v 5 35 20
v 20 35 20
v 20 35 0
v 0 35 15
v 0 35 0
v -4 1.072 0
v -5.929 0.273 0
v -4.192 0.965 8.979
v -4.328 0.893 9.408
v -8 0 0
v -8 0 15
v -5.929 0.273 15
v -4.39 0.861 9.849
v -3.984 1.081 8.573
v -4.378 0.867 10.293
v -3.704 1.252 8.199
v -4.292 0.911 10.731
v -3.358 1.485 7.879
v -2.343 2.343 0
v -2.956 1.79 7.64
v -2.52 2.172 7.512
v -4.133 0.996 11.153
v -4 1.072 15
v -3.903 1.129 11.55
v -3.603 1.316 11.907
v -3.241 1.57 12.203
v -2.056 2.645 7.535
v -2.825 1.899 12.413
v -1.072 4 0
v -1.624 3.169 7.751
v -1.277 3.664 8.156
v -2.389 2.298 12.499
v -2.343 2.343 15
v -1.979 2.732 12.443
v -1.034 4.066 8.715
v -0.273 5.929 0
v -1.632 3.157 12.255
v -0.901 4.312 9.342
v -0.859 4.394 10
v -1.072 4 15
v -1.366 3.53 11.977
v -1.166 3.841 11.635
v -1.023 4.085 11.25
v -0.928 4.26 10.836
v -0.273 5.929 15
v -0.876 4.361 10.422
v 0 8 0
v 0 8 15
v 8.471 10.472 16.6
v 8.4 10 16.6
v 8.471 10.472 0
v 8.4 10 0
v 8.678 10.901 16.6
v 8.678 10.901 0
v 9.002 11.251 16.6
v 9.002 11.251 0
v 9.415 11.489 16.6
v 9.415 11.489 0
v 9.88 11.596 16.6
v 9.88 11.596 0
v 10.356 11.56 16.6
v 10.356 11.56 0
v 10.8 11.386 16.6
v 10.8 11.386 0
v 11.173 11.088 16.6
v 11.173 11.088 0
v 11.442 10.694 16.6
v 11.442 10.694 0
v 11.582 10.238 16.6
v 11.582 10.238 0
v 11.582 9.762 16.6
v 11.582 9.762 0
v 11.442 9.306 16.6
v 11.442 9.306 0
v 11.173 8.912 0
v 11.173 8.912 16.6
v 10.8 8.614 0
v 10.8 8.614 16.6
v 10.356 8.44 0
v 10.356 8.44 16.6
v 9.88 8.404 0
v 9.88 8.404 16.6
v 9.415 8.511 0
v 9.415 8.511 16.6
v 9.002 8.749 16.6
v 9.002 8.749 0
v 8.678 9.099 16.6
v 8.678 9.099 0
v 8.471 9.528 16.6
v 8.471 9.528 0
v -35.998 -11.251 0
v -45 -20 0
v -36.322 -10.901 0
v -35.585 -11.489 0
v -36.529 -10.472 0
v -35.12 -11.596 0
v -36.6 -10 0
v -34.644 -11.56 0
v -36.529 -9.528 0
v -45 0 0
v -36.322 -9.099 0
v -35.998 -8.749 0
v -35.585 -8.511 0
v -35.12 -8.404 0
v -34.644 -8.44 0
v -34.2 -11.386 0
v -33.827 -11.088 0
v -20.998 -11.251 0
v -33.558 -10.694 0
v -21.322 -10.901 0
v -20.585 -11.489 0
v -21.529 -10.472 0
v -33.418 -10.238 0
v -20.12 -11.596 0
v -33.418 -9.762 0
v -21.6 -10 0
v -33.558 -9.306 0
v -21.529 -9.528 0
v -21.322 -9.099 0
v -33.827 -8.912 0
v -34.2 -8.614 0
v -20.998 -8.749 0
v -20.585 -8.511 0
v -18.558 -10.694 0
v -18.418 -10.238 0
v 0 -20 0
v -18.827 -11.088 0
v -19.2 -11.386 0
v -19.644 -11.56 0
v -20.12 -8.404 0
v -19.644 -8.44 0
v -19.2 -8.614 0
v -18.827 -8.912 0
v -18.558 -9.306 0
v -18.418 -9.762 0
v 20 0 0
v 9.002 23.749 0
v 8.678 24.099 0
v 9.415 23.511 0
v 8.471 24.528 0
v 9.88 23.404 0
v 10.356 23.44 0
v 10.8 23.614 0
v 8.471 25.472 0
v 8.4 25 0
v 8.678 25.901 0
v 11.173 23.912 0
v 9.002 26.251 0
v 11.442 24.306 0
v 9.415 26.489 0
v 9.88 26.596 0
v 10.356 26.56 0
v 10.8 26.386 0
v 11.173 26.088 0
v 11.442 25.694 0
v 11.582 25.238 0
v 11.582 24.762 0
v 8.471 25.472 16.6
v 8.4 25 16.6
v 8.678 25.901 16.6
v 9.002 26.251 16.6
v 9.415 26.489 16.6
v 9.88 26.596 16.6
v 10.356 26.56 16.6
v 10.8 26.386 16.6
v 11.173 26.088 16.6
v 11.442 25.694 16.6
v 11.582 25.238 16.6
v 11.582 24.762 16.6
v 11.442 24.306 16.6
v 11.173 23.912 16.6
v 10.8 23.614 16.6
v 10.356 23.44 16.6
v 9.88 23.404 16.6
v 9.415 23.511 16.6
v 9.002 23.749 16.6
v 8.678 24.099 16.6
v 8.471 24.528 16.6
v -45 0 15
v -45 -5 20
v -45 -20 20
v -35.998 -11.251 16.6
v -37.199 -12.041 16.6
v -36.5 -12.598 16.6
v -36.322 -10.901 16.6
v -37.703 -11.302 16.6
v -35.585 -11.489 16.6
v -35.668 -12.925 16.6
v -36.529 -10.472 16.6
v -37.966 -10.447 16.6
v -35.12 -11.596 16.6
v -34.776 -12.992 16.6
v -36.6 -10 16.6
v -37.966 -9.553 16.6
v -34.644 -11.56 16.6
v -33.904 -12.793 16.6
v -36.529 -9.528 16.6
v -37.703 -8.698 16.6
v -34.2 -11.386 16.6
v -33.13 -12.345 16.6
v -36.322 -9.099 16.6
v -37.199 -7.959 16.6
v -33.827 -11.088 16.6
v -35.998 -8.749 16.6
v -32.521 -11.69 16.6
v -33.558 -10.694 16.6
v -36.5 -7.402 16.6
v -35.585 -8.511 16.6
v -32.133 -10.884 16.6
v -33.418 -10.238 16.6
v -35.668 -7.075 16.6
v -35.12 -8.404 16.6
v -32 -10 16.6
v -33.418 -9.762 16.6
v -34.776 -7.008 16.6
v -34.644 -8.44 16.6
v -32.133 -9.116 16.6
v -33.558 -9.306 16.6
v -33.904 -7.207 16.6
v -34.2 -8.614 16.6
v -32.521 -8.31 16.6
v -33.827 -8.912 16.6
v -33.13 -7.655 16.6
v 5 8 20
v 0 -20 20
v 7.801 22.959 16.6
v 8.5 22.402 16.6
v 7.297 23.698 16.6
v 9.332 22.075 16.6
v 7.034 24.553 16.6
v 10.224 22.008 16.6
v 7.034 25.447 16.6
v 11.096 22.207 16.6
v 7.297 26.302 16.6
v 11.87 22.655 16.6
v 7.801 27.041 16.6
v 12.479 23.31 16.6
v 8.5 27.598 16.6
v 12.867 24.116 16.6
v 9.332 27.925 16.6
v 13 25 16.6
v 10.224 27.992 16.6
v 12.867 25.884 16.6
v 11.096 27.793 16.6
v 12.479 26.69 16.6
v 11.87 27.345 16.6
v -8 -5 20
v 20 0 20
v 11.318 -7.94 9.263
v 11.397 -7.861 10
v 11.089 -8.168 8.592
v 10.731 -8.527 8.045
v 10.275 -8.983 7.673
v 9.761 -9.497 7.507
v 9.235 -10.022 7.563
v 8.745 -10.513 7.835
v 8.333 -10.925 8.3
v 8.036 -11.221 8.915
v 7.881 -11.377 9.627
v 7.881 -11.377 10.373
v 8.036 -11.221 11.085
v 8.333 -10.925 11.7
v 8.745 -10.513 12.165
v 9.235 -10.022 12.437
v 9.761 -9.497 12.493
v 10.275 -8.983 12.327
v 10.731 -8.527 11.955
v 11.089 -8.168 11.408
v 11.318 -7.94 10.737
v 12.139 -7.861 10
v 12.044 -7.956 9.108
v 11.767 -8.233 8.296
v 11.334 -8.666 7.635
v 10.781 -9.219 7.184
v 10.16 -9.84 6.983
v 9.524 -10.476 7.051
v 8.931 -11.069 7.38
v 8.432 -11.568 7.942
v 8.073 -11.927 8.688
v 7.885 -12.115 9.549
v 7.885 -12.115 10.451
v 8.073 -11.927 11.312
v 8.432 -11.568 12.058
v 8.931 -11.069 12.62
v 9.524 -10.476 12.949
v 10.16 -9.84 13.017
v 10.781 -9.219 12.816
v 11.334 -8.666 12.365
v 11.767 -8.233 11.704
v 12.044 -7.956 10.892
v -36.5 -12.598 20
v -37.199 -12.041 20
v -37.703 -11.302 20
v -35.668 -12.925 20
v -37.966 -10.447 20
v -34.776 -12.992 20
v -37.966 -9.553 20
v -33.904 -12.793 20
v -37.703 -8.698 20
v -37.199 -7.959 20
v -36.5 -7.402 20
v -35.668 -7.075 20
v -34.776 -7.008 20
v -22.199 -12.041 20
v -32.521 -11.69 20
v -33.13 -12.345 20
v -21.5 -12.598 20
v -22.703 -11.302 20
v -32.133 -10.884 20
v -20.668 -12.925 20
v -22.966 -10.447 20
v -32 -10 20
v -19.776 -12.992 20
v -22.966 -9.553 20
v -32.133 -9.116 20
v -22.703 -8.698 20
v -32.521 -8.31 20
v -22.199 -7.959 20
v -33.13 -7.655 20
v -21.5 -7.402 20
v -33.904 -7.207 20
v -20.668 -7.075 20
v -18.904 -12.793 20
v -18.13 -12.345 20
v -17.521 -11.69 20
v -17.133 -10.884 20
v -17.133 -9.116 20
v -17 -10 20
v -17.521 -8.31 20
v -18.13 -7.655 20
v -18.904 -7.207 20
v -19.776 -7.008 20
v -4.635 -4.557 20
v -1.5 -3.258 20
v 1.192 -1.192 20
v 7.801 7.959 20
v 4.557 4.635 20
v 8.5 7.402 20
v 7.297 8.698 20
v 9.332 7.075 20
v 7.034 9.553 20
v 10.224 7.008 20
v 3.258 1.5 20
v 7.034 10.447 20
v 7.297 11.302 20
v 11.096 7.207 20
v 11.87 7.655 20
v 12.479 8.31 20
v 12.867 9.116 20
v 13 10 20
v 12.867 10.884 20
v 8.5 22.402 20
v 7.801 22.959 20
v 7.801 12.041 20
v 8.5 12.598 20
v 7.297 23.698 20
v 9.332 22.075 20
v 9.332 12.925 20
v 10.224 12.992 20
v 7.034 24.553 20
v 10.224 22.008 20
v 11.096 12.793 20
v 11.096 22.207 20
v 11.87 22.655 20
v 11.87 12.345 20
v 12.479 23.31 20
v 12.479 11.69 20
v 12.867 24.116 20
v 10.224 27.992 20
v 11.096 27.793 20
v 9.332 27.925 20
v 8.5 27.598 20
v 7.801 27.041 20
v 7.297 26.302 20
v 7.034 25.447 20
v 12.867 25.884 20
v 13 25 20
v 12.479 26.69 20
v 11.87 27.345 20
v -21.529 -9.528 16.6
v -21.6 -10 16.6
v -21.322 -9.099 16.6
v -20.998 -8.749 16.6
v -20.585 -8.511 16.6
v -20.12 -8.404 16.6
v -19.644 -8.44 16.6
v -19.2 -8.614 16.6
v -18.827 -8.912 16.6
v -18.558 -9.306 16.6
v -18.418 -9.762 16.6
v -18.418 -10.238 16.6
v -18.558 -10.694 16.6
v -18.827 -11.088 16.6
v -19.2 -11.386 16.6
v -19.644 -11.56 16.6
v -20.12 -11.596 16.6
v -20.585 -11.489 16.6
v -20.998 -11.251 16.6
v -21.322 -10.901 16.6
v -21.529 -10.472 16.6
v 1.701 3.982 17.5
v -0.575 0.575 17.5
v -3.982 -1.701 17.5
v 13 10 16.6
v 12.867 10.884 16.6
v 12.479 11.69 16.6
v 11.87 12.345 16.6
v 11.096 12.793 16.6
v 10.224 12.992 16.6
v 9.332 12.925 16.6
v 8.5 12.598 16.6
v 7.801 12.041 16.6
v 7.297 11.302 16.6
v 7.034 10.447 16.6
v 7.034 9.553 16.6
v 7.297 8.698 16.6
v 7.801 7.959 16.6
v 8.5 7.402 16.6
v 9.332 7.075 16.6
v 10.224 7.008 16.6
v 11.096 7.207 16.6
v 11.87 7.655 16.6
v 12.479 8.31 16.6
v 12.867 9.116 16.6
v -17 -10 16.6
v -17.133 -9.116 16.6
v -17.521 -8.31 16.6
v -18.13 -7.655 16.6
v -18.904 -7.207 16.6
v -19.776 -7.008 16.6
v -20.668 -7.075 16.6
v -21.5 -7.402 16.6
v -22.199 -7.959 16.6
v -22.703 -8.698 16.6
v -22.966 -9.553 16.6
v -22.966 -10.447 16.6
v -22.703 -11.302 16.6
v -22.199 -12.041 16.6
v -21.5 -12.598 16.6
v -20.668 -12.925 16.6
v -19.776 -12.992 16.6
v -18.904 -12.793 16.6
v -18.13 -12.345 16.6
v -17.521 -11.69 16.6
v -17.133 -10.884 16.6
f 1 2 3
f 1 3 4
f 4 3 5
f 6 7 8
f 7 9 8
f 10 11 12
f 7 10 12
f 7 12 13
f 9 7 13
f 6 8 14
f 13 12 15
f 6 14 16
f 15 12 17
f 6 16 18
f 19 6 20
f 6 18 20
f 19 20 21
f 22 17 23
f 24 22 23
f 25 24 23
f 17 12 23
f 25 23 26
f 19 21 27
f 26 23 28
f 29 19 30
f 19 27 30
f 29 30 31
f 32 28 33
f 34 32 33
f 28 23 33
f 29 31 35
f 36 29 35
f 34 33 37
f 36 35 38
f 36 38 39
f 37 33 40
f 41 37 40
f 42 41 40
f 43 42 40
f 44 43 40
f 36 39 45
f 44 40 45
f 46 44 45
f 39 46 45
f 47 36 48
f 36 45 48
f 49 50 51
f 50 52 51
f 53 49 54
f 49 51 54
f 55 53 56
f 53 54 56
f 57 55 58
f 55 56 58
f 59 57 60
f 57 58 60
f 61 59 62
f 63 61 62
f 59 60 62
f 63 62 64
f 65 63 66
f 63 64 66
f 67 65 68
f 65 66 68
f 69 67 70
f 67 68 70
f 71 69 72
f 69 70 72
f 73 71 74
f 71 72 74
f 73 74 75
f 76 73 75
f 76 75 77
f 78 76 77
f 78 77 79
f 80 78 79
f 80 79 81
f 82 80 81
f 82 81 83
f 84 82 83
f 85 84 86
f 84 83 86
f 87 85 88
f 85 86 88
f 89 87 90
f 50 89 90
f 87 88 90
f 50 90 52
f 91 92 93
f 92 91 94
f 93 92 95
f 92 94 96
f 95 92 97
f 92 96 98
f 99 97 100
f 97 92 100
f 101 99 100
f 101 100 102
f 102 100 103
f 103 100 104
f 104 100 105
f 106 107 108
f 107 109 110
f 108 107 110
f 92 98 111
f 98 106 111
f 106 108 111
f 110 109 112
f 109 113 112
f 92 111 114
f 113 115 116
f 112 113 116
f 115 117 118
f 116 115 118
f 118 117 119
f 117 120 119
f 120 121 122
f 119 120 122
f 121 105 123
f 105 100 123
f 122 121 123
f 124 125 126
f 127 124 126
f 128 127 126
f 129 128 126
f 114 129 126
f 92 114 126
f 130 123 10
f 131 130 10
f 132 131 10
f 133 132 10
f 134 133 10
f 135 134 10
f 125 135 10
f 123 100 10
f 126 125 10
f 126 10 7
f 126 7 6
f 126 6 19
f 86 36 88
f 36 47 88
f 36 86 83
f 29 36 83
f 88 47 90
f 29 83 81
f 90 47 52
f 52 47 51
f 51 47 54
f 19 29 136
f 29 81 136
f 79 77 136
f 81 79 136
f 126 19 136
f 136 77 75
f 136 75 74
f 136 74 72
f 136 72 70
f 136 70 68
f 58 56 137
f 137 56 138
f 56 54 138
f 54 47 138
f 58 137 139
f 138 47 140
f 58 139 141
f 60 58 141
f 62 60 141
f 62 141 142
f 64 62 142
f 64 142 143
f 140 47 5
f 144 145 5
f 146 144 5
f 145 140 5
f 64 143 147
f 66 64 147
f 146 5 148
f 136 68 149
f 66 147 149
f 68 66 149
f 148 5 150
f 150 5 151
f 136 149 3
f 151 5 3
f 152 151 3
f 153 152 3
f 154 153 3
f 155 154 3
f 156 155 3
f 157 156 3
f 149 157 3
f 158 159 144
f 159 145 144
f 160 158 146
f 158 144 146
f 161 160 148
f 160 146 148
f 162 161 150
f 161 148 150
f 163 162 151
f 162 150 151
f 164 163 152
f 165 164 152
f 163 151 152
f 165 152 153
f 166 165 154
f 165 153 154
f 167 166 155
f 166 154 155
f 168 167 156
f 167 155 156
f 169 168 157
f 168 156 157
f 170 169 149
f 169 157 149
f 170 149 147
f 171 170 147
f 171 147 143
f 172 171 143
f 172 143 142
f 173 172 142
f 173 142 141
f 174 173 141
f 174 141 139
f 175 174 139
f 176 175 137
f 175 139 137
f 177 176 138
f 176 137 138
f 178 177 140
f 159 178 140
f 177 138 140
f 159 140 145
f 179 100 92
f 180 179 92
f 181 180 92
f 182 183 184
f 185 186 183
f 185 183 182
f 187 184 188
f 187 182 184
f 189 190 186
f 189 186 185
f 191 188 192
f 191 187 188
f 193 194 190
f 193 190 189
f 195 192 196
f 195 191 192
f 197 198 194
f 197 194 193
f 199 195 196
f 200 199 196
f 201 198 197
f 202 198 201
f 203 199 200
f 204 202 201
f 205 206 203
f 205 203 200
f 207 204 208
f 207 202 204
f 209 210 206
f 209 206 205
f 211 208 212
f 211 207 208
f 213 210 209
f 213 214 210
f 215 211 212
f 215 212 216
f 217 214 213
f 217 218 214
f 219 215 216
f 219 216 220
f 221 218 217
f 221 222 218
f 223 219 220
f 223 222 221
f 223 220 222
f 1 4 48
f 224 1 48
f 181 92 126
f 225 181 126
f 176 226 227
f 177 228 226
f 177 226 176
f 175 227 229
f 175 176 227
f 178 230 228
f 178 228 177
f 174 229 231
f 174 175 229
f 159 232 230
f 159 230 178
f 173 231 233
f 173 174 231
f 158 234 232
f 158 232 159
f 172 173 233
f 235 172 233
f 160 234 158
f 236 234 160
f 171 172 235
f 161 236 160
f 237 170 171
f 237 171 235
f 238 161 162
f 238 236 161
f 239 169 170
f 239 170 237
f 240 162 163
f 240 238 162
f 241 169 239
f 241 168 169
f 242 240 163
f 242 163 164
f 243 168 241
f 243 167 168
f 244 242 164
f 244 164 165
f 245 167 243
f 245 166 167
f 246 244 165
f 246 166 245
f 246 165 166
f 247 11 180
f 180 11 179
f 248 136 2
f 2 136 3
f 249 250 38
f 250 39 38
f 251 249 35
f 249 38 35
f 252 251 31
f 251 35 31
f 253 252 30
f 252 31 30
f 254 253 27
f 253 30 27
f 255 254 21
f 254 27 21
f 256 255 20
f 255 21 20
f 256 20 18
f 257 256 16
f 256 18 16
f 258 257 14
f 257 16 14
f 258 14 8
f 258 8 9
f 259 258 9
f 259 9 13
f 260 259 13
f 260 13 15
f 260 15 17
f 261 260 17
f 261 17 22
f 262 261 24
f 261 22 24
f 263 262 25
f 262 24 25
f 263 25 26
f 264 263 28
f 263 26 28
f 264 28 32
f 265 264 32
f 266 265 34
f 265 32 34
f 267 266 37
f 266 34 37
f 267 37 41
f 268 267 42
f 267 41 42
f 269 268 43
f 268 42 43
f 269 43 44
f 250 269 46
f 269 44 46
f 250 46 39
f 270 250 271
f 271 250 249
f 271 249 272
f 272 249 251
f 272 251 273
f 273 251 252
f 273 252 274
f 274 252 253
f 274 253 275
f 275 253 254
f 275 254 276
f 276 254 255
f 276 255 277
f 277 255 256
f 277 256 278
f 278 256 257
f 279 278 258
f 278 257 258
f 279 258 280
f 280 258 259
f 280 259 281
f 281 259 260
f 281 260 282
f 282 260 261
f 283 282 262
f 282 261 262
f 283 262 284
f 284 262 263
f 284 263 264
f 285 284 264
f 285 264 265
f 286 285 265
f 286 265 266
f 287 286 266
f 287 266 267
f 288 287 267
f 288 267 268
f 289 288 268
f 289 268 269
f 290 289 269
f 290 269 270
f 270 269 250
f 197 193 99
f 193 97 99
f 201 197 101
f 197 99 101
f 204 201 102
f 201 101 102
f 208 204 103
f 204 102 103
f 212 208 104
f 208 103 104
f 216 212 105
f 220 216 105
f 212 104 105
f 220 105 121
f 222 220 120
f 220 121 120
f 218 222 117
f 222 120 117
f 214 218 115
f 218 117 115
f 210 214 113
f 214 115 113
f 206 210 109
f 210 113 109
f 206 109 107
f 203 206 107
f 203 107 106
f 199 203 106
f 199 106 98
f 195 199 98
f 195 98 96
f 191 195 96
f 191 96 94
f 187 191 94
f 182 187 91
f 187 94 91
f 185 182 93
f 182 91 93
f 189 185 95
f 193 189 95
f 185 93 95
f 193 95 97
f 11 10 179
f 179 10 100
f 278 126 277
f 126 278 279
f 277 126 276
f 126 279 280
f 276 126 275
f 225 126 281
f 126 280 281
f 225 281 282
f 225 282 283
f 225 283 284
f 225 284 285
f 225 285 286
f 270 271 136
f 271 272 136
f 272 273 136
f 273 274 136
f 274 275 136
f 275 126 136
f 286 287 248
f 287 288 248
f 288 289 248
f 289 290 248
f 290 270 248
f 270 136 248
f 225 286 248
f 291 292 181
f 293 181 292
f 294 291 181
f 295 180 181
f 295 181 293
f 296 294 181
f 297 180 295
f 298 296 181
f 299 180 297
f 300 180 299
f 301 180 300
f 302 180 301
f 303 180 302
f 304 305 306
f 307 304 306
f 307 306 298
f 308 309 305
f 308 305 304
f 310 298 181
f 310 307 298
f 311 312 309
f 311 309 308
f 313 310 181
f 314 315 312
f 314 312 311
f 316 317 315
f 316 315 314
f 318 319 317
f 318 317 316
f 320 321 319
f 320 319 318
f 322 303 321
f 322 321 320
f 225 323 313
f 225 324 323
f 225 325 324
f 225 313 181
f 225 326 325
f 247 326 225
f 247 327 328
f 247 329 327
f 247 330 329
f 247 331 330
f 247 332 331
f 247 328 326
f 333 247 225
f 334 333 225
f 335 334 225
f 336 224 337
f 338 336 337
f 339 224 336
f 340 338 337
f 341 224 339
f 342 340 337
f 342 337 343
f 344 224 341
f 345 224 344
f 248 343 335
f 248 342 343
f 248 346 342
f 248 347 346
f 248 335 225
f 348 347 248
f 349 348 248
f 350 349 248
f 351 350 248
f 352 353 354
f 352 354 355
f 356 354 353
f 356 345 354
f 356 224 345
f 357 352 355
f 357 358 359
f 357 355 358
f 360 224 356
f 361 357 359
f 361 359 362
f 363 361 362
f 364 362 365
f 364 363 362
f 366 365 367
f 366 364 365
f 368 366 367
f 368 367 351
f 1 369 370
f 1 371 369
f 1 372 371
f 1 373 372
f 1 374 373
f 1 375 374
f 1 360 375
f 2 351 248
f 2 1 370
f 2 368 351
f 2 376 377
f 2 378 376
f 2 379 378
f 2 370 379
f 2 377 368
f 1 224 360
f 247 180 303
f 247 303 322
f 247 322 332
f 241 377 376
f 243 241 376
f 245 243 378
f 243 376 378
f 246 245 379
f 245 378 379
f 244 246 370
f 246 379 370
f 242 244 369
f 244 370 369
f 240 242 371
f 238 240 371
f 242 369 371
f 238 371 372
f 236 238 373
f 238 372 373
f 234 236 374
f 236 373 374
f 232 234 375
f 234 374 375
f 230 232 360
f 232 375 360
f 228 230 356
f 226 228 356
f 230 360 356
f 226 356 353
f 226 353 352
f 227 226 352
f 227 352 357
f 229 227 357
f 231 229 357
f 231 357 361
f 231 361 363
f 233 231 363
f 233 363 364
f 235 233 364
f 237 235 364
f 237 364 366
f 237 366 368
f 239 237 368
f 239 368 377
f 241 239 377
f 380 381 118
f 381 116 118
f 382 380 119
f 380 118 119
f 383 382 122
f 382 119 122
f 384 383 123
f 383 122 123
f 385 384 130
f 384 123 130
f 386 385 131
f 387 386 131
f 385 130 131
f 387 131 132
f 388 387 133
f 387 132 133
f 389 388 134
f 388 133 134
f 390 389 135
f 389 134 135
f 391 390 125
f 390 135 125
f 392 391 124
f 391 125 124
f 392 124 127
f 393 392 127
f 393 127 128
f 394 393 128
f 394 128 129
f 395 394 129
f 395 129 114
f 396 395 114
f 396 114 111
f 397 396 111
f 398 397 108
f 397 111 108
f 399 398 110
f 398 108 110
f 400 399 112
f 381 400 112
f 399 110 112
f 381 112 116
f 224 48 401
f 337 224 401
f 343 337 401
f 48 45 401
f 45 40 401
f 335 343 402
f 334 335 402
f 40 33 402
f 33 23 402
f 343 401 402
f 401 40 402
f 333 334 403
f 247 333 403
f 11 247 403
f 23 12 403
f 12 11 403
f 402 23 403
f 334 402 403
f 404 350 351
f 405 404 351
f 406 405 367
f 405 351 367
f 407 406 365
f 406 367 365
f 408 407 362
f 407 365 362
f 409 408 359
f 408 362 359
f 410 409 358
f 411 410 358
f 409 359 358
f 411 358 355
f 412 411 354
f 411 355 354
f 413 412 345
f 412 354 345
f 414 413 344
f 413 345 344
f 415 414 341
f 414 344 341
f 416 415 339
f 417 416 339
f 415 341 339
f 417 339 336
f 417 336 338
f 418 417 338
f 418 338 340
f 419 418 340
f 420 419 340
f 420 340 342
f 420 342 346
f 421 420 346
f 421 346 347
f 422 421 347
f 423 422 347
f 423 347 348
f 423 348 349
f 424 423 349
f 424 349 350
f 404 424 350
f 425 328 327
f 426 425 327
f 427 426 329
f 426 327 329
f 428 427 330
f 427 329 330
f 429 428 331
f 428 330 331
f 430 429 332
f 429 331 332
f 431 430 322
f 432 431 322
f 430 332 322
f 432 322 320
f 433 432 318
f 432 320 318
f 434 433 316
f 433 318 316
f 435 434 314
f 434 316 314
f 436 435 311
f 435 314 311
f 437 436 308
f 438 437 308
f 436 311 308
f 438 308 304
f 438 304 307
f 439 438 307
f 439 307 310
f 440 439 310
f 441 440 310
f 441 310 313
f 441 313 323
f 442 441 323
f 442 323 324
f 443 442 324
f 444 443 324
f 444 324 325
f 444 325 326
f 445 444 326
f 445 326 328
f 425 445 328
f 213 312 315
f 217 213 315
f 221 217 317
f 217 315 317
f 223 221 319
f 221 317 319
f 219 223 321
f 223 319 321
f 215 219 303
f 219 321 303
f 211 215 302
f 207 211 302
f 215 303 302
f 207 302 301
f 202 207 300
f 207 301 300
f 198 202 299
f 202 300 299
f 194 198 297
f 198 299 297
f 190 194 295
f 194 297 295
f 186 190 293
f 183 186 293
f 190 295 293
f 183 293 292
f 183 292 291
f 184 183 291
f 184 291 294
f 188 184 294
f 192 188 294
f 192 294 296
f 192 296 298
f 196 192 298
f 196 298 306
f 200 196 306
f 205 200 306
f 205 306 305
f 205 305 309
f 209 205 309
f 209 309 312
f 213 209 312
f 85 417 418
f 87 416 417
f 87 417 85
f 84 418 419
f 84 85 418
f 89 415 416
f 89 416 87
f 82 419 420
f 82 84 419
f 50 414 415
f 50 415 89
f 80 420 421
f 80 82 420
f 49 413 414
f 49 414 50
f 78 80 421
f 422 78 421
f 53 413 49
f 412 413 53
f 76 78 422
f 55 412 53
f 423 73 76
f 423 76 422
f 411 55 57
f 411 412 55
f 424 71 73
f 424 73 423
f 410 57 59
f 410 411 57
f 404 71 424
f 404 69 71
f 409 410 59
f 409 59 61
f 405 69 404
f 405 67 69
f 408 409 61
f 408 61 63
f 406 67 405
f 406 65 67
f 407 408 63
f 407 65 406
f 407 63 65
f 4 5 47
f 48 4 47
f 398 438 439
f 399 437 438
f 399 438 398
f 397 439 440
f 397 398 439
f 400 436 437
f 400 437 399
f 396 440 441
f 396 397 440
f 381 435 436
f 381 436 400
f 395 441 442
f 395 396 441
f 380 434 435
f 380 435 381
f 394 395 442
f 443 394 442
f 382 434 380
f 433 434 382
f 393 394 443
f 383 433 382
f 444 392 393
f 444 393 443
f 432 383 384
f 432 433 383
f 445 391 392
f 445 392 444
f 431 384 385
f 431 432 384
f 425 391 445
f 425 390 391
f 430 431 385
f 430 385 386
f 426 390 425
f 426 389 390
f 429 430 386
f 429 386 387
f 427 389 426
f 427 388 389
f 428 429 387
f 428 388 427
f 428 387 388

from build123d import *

# Parameters (mm, degrees)
BOSS_EXTRUDE1_DEPTH                                  = 20
CBORE_FOR_M3_HEXAGON_SOCKET_HEAD_CAP_SCR_D           = 3.2
CBORE_FOR_M3_HEXAGON_SOCKET_HEAD_CAP_SCR_CBORE_D     = 6
CBORE_FOR_M3_HEXAGON_SOCKET_HEAD_CAP_SCR_CBORE_DEPTH = 3.4
FILLET1_R                                            = 8
CHAMFER1_SIZE                                        = 20
M6_TAPPED_HOLE1_D                                    = 5
M6_TAPPED_HOLE1_CSINK_D                              = 6.05
M6_TAPPED_HOLE1_CSINK_ANGLE                          = 90
CHAMFER2_SIZE                                        = 5


with BuildPart() as part:
    # Sketch1 → Boss-Extrude1 (new body)
    with BuildSketch(Plane.XY):
        Polygon((0, 0), (-45, 0), (-45, -20), (20, -20), (20, 35), (0, 35), align=None)
    extrude(amount=BOSS_EXTRUDE1_DEPTH)

    # CBORE for M3 Hexagon socket head cap screws1 (through all)
    with Locations(Plane.XY.offset(20)):
        with Locations((-35, -10), (-20, -10), (10, 25), (10, 10)):
            CounterBoreHole(CBORE_FOR_M3_HEXAGON_SOCKET_HEAD_CAP_SCR_D / 2, CBORE_FOR_M3_HEXAGON_SOCKET_HEAD_CAP_SCR_CBORE_D / 2, CBORE_FOR_M3_HEXAGON_SOCKET_HEAD_CAP_SCR_CBORE_DEPTH)

    # Fillet1
    fillet1_edges = [part.edges().sort_by_distance(p)[0] for p in [
        (0, 0, 10),
    ]]
    fillet(fillet1_edges, radius=FILLET1_R)

    # Chamfer1
    chamfer1_edges = [part.edges().sort_by_distance(p)[0] for p in [
        (20, -20, 10),
    ]]
    chamfer(chamfer1_edges, length=CHAMFER1_SIZE)

    # M6 Tapped Hole1 (through all)
    with Locations(Plane(origin=(10, -10, 0), x_dir=(-0.7071067811865495, -0.7071067811865457, 0), z_dir=(0.7071067811865457, -0.7071067811865495, 0))):
        with Locations((0, -10)):
            CounterSinkHole(M6_TAPPED_HOLE1_D / 2, M6_TAPPED_HOLE1_CSINK_D / 2, counter_sink_angle=M6_TAPPED_HOLE1_CSINK_ANGLE)

    # Chamfer2
    chamfer2_edges = [part.edges().sort_by_distance(p)[0] for p in [
        (0, 21.5, 20),
        (-26.5, 0, 20),
        (-2.343145751, 2.343145751, 20),
    ]]
    chamfer(chamfer2_edges, length=CHAMFER2_SIZE)


solid = part.part
